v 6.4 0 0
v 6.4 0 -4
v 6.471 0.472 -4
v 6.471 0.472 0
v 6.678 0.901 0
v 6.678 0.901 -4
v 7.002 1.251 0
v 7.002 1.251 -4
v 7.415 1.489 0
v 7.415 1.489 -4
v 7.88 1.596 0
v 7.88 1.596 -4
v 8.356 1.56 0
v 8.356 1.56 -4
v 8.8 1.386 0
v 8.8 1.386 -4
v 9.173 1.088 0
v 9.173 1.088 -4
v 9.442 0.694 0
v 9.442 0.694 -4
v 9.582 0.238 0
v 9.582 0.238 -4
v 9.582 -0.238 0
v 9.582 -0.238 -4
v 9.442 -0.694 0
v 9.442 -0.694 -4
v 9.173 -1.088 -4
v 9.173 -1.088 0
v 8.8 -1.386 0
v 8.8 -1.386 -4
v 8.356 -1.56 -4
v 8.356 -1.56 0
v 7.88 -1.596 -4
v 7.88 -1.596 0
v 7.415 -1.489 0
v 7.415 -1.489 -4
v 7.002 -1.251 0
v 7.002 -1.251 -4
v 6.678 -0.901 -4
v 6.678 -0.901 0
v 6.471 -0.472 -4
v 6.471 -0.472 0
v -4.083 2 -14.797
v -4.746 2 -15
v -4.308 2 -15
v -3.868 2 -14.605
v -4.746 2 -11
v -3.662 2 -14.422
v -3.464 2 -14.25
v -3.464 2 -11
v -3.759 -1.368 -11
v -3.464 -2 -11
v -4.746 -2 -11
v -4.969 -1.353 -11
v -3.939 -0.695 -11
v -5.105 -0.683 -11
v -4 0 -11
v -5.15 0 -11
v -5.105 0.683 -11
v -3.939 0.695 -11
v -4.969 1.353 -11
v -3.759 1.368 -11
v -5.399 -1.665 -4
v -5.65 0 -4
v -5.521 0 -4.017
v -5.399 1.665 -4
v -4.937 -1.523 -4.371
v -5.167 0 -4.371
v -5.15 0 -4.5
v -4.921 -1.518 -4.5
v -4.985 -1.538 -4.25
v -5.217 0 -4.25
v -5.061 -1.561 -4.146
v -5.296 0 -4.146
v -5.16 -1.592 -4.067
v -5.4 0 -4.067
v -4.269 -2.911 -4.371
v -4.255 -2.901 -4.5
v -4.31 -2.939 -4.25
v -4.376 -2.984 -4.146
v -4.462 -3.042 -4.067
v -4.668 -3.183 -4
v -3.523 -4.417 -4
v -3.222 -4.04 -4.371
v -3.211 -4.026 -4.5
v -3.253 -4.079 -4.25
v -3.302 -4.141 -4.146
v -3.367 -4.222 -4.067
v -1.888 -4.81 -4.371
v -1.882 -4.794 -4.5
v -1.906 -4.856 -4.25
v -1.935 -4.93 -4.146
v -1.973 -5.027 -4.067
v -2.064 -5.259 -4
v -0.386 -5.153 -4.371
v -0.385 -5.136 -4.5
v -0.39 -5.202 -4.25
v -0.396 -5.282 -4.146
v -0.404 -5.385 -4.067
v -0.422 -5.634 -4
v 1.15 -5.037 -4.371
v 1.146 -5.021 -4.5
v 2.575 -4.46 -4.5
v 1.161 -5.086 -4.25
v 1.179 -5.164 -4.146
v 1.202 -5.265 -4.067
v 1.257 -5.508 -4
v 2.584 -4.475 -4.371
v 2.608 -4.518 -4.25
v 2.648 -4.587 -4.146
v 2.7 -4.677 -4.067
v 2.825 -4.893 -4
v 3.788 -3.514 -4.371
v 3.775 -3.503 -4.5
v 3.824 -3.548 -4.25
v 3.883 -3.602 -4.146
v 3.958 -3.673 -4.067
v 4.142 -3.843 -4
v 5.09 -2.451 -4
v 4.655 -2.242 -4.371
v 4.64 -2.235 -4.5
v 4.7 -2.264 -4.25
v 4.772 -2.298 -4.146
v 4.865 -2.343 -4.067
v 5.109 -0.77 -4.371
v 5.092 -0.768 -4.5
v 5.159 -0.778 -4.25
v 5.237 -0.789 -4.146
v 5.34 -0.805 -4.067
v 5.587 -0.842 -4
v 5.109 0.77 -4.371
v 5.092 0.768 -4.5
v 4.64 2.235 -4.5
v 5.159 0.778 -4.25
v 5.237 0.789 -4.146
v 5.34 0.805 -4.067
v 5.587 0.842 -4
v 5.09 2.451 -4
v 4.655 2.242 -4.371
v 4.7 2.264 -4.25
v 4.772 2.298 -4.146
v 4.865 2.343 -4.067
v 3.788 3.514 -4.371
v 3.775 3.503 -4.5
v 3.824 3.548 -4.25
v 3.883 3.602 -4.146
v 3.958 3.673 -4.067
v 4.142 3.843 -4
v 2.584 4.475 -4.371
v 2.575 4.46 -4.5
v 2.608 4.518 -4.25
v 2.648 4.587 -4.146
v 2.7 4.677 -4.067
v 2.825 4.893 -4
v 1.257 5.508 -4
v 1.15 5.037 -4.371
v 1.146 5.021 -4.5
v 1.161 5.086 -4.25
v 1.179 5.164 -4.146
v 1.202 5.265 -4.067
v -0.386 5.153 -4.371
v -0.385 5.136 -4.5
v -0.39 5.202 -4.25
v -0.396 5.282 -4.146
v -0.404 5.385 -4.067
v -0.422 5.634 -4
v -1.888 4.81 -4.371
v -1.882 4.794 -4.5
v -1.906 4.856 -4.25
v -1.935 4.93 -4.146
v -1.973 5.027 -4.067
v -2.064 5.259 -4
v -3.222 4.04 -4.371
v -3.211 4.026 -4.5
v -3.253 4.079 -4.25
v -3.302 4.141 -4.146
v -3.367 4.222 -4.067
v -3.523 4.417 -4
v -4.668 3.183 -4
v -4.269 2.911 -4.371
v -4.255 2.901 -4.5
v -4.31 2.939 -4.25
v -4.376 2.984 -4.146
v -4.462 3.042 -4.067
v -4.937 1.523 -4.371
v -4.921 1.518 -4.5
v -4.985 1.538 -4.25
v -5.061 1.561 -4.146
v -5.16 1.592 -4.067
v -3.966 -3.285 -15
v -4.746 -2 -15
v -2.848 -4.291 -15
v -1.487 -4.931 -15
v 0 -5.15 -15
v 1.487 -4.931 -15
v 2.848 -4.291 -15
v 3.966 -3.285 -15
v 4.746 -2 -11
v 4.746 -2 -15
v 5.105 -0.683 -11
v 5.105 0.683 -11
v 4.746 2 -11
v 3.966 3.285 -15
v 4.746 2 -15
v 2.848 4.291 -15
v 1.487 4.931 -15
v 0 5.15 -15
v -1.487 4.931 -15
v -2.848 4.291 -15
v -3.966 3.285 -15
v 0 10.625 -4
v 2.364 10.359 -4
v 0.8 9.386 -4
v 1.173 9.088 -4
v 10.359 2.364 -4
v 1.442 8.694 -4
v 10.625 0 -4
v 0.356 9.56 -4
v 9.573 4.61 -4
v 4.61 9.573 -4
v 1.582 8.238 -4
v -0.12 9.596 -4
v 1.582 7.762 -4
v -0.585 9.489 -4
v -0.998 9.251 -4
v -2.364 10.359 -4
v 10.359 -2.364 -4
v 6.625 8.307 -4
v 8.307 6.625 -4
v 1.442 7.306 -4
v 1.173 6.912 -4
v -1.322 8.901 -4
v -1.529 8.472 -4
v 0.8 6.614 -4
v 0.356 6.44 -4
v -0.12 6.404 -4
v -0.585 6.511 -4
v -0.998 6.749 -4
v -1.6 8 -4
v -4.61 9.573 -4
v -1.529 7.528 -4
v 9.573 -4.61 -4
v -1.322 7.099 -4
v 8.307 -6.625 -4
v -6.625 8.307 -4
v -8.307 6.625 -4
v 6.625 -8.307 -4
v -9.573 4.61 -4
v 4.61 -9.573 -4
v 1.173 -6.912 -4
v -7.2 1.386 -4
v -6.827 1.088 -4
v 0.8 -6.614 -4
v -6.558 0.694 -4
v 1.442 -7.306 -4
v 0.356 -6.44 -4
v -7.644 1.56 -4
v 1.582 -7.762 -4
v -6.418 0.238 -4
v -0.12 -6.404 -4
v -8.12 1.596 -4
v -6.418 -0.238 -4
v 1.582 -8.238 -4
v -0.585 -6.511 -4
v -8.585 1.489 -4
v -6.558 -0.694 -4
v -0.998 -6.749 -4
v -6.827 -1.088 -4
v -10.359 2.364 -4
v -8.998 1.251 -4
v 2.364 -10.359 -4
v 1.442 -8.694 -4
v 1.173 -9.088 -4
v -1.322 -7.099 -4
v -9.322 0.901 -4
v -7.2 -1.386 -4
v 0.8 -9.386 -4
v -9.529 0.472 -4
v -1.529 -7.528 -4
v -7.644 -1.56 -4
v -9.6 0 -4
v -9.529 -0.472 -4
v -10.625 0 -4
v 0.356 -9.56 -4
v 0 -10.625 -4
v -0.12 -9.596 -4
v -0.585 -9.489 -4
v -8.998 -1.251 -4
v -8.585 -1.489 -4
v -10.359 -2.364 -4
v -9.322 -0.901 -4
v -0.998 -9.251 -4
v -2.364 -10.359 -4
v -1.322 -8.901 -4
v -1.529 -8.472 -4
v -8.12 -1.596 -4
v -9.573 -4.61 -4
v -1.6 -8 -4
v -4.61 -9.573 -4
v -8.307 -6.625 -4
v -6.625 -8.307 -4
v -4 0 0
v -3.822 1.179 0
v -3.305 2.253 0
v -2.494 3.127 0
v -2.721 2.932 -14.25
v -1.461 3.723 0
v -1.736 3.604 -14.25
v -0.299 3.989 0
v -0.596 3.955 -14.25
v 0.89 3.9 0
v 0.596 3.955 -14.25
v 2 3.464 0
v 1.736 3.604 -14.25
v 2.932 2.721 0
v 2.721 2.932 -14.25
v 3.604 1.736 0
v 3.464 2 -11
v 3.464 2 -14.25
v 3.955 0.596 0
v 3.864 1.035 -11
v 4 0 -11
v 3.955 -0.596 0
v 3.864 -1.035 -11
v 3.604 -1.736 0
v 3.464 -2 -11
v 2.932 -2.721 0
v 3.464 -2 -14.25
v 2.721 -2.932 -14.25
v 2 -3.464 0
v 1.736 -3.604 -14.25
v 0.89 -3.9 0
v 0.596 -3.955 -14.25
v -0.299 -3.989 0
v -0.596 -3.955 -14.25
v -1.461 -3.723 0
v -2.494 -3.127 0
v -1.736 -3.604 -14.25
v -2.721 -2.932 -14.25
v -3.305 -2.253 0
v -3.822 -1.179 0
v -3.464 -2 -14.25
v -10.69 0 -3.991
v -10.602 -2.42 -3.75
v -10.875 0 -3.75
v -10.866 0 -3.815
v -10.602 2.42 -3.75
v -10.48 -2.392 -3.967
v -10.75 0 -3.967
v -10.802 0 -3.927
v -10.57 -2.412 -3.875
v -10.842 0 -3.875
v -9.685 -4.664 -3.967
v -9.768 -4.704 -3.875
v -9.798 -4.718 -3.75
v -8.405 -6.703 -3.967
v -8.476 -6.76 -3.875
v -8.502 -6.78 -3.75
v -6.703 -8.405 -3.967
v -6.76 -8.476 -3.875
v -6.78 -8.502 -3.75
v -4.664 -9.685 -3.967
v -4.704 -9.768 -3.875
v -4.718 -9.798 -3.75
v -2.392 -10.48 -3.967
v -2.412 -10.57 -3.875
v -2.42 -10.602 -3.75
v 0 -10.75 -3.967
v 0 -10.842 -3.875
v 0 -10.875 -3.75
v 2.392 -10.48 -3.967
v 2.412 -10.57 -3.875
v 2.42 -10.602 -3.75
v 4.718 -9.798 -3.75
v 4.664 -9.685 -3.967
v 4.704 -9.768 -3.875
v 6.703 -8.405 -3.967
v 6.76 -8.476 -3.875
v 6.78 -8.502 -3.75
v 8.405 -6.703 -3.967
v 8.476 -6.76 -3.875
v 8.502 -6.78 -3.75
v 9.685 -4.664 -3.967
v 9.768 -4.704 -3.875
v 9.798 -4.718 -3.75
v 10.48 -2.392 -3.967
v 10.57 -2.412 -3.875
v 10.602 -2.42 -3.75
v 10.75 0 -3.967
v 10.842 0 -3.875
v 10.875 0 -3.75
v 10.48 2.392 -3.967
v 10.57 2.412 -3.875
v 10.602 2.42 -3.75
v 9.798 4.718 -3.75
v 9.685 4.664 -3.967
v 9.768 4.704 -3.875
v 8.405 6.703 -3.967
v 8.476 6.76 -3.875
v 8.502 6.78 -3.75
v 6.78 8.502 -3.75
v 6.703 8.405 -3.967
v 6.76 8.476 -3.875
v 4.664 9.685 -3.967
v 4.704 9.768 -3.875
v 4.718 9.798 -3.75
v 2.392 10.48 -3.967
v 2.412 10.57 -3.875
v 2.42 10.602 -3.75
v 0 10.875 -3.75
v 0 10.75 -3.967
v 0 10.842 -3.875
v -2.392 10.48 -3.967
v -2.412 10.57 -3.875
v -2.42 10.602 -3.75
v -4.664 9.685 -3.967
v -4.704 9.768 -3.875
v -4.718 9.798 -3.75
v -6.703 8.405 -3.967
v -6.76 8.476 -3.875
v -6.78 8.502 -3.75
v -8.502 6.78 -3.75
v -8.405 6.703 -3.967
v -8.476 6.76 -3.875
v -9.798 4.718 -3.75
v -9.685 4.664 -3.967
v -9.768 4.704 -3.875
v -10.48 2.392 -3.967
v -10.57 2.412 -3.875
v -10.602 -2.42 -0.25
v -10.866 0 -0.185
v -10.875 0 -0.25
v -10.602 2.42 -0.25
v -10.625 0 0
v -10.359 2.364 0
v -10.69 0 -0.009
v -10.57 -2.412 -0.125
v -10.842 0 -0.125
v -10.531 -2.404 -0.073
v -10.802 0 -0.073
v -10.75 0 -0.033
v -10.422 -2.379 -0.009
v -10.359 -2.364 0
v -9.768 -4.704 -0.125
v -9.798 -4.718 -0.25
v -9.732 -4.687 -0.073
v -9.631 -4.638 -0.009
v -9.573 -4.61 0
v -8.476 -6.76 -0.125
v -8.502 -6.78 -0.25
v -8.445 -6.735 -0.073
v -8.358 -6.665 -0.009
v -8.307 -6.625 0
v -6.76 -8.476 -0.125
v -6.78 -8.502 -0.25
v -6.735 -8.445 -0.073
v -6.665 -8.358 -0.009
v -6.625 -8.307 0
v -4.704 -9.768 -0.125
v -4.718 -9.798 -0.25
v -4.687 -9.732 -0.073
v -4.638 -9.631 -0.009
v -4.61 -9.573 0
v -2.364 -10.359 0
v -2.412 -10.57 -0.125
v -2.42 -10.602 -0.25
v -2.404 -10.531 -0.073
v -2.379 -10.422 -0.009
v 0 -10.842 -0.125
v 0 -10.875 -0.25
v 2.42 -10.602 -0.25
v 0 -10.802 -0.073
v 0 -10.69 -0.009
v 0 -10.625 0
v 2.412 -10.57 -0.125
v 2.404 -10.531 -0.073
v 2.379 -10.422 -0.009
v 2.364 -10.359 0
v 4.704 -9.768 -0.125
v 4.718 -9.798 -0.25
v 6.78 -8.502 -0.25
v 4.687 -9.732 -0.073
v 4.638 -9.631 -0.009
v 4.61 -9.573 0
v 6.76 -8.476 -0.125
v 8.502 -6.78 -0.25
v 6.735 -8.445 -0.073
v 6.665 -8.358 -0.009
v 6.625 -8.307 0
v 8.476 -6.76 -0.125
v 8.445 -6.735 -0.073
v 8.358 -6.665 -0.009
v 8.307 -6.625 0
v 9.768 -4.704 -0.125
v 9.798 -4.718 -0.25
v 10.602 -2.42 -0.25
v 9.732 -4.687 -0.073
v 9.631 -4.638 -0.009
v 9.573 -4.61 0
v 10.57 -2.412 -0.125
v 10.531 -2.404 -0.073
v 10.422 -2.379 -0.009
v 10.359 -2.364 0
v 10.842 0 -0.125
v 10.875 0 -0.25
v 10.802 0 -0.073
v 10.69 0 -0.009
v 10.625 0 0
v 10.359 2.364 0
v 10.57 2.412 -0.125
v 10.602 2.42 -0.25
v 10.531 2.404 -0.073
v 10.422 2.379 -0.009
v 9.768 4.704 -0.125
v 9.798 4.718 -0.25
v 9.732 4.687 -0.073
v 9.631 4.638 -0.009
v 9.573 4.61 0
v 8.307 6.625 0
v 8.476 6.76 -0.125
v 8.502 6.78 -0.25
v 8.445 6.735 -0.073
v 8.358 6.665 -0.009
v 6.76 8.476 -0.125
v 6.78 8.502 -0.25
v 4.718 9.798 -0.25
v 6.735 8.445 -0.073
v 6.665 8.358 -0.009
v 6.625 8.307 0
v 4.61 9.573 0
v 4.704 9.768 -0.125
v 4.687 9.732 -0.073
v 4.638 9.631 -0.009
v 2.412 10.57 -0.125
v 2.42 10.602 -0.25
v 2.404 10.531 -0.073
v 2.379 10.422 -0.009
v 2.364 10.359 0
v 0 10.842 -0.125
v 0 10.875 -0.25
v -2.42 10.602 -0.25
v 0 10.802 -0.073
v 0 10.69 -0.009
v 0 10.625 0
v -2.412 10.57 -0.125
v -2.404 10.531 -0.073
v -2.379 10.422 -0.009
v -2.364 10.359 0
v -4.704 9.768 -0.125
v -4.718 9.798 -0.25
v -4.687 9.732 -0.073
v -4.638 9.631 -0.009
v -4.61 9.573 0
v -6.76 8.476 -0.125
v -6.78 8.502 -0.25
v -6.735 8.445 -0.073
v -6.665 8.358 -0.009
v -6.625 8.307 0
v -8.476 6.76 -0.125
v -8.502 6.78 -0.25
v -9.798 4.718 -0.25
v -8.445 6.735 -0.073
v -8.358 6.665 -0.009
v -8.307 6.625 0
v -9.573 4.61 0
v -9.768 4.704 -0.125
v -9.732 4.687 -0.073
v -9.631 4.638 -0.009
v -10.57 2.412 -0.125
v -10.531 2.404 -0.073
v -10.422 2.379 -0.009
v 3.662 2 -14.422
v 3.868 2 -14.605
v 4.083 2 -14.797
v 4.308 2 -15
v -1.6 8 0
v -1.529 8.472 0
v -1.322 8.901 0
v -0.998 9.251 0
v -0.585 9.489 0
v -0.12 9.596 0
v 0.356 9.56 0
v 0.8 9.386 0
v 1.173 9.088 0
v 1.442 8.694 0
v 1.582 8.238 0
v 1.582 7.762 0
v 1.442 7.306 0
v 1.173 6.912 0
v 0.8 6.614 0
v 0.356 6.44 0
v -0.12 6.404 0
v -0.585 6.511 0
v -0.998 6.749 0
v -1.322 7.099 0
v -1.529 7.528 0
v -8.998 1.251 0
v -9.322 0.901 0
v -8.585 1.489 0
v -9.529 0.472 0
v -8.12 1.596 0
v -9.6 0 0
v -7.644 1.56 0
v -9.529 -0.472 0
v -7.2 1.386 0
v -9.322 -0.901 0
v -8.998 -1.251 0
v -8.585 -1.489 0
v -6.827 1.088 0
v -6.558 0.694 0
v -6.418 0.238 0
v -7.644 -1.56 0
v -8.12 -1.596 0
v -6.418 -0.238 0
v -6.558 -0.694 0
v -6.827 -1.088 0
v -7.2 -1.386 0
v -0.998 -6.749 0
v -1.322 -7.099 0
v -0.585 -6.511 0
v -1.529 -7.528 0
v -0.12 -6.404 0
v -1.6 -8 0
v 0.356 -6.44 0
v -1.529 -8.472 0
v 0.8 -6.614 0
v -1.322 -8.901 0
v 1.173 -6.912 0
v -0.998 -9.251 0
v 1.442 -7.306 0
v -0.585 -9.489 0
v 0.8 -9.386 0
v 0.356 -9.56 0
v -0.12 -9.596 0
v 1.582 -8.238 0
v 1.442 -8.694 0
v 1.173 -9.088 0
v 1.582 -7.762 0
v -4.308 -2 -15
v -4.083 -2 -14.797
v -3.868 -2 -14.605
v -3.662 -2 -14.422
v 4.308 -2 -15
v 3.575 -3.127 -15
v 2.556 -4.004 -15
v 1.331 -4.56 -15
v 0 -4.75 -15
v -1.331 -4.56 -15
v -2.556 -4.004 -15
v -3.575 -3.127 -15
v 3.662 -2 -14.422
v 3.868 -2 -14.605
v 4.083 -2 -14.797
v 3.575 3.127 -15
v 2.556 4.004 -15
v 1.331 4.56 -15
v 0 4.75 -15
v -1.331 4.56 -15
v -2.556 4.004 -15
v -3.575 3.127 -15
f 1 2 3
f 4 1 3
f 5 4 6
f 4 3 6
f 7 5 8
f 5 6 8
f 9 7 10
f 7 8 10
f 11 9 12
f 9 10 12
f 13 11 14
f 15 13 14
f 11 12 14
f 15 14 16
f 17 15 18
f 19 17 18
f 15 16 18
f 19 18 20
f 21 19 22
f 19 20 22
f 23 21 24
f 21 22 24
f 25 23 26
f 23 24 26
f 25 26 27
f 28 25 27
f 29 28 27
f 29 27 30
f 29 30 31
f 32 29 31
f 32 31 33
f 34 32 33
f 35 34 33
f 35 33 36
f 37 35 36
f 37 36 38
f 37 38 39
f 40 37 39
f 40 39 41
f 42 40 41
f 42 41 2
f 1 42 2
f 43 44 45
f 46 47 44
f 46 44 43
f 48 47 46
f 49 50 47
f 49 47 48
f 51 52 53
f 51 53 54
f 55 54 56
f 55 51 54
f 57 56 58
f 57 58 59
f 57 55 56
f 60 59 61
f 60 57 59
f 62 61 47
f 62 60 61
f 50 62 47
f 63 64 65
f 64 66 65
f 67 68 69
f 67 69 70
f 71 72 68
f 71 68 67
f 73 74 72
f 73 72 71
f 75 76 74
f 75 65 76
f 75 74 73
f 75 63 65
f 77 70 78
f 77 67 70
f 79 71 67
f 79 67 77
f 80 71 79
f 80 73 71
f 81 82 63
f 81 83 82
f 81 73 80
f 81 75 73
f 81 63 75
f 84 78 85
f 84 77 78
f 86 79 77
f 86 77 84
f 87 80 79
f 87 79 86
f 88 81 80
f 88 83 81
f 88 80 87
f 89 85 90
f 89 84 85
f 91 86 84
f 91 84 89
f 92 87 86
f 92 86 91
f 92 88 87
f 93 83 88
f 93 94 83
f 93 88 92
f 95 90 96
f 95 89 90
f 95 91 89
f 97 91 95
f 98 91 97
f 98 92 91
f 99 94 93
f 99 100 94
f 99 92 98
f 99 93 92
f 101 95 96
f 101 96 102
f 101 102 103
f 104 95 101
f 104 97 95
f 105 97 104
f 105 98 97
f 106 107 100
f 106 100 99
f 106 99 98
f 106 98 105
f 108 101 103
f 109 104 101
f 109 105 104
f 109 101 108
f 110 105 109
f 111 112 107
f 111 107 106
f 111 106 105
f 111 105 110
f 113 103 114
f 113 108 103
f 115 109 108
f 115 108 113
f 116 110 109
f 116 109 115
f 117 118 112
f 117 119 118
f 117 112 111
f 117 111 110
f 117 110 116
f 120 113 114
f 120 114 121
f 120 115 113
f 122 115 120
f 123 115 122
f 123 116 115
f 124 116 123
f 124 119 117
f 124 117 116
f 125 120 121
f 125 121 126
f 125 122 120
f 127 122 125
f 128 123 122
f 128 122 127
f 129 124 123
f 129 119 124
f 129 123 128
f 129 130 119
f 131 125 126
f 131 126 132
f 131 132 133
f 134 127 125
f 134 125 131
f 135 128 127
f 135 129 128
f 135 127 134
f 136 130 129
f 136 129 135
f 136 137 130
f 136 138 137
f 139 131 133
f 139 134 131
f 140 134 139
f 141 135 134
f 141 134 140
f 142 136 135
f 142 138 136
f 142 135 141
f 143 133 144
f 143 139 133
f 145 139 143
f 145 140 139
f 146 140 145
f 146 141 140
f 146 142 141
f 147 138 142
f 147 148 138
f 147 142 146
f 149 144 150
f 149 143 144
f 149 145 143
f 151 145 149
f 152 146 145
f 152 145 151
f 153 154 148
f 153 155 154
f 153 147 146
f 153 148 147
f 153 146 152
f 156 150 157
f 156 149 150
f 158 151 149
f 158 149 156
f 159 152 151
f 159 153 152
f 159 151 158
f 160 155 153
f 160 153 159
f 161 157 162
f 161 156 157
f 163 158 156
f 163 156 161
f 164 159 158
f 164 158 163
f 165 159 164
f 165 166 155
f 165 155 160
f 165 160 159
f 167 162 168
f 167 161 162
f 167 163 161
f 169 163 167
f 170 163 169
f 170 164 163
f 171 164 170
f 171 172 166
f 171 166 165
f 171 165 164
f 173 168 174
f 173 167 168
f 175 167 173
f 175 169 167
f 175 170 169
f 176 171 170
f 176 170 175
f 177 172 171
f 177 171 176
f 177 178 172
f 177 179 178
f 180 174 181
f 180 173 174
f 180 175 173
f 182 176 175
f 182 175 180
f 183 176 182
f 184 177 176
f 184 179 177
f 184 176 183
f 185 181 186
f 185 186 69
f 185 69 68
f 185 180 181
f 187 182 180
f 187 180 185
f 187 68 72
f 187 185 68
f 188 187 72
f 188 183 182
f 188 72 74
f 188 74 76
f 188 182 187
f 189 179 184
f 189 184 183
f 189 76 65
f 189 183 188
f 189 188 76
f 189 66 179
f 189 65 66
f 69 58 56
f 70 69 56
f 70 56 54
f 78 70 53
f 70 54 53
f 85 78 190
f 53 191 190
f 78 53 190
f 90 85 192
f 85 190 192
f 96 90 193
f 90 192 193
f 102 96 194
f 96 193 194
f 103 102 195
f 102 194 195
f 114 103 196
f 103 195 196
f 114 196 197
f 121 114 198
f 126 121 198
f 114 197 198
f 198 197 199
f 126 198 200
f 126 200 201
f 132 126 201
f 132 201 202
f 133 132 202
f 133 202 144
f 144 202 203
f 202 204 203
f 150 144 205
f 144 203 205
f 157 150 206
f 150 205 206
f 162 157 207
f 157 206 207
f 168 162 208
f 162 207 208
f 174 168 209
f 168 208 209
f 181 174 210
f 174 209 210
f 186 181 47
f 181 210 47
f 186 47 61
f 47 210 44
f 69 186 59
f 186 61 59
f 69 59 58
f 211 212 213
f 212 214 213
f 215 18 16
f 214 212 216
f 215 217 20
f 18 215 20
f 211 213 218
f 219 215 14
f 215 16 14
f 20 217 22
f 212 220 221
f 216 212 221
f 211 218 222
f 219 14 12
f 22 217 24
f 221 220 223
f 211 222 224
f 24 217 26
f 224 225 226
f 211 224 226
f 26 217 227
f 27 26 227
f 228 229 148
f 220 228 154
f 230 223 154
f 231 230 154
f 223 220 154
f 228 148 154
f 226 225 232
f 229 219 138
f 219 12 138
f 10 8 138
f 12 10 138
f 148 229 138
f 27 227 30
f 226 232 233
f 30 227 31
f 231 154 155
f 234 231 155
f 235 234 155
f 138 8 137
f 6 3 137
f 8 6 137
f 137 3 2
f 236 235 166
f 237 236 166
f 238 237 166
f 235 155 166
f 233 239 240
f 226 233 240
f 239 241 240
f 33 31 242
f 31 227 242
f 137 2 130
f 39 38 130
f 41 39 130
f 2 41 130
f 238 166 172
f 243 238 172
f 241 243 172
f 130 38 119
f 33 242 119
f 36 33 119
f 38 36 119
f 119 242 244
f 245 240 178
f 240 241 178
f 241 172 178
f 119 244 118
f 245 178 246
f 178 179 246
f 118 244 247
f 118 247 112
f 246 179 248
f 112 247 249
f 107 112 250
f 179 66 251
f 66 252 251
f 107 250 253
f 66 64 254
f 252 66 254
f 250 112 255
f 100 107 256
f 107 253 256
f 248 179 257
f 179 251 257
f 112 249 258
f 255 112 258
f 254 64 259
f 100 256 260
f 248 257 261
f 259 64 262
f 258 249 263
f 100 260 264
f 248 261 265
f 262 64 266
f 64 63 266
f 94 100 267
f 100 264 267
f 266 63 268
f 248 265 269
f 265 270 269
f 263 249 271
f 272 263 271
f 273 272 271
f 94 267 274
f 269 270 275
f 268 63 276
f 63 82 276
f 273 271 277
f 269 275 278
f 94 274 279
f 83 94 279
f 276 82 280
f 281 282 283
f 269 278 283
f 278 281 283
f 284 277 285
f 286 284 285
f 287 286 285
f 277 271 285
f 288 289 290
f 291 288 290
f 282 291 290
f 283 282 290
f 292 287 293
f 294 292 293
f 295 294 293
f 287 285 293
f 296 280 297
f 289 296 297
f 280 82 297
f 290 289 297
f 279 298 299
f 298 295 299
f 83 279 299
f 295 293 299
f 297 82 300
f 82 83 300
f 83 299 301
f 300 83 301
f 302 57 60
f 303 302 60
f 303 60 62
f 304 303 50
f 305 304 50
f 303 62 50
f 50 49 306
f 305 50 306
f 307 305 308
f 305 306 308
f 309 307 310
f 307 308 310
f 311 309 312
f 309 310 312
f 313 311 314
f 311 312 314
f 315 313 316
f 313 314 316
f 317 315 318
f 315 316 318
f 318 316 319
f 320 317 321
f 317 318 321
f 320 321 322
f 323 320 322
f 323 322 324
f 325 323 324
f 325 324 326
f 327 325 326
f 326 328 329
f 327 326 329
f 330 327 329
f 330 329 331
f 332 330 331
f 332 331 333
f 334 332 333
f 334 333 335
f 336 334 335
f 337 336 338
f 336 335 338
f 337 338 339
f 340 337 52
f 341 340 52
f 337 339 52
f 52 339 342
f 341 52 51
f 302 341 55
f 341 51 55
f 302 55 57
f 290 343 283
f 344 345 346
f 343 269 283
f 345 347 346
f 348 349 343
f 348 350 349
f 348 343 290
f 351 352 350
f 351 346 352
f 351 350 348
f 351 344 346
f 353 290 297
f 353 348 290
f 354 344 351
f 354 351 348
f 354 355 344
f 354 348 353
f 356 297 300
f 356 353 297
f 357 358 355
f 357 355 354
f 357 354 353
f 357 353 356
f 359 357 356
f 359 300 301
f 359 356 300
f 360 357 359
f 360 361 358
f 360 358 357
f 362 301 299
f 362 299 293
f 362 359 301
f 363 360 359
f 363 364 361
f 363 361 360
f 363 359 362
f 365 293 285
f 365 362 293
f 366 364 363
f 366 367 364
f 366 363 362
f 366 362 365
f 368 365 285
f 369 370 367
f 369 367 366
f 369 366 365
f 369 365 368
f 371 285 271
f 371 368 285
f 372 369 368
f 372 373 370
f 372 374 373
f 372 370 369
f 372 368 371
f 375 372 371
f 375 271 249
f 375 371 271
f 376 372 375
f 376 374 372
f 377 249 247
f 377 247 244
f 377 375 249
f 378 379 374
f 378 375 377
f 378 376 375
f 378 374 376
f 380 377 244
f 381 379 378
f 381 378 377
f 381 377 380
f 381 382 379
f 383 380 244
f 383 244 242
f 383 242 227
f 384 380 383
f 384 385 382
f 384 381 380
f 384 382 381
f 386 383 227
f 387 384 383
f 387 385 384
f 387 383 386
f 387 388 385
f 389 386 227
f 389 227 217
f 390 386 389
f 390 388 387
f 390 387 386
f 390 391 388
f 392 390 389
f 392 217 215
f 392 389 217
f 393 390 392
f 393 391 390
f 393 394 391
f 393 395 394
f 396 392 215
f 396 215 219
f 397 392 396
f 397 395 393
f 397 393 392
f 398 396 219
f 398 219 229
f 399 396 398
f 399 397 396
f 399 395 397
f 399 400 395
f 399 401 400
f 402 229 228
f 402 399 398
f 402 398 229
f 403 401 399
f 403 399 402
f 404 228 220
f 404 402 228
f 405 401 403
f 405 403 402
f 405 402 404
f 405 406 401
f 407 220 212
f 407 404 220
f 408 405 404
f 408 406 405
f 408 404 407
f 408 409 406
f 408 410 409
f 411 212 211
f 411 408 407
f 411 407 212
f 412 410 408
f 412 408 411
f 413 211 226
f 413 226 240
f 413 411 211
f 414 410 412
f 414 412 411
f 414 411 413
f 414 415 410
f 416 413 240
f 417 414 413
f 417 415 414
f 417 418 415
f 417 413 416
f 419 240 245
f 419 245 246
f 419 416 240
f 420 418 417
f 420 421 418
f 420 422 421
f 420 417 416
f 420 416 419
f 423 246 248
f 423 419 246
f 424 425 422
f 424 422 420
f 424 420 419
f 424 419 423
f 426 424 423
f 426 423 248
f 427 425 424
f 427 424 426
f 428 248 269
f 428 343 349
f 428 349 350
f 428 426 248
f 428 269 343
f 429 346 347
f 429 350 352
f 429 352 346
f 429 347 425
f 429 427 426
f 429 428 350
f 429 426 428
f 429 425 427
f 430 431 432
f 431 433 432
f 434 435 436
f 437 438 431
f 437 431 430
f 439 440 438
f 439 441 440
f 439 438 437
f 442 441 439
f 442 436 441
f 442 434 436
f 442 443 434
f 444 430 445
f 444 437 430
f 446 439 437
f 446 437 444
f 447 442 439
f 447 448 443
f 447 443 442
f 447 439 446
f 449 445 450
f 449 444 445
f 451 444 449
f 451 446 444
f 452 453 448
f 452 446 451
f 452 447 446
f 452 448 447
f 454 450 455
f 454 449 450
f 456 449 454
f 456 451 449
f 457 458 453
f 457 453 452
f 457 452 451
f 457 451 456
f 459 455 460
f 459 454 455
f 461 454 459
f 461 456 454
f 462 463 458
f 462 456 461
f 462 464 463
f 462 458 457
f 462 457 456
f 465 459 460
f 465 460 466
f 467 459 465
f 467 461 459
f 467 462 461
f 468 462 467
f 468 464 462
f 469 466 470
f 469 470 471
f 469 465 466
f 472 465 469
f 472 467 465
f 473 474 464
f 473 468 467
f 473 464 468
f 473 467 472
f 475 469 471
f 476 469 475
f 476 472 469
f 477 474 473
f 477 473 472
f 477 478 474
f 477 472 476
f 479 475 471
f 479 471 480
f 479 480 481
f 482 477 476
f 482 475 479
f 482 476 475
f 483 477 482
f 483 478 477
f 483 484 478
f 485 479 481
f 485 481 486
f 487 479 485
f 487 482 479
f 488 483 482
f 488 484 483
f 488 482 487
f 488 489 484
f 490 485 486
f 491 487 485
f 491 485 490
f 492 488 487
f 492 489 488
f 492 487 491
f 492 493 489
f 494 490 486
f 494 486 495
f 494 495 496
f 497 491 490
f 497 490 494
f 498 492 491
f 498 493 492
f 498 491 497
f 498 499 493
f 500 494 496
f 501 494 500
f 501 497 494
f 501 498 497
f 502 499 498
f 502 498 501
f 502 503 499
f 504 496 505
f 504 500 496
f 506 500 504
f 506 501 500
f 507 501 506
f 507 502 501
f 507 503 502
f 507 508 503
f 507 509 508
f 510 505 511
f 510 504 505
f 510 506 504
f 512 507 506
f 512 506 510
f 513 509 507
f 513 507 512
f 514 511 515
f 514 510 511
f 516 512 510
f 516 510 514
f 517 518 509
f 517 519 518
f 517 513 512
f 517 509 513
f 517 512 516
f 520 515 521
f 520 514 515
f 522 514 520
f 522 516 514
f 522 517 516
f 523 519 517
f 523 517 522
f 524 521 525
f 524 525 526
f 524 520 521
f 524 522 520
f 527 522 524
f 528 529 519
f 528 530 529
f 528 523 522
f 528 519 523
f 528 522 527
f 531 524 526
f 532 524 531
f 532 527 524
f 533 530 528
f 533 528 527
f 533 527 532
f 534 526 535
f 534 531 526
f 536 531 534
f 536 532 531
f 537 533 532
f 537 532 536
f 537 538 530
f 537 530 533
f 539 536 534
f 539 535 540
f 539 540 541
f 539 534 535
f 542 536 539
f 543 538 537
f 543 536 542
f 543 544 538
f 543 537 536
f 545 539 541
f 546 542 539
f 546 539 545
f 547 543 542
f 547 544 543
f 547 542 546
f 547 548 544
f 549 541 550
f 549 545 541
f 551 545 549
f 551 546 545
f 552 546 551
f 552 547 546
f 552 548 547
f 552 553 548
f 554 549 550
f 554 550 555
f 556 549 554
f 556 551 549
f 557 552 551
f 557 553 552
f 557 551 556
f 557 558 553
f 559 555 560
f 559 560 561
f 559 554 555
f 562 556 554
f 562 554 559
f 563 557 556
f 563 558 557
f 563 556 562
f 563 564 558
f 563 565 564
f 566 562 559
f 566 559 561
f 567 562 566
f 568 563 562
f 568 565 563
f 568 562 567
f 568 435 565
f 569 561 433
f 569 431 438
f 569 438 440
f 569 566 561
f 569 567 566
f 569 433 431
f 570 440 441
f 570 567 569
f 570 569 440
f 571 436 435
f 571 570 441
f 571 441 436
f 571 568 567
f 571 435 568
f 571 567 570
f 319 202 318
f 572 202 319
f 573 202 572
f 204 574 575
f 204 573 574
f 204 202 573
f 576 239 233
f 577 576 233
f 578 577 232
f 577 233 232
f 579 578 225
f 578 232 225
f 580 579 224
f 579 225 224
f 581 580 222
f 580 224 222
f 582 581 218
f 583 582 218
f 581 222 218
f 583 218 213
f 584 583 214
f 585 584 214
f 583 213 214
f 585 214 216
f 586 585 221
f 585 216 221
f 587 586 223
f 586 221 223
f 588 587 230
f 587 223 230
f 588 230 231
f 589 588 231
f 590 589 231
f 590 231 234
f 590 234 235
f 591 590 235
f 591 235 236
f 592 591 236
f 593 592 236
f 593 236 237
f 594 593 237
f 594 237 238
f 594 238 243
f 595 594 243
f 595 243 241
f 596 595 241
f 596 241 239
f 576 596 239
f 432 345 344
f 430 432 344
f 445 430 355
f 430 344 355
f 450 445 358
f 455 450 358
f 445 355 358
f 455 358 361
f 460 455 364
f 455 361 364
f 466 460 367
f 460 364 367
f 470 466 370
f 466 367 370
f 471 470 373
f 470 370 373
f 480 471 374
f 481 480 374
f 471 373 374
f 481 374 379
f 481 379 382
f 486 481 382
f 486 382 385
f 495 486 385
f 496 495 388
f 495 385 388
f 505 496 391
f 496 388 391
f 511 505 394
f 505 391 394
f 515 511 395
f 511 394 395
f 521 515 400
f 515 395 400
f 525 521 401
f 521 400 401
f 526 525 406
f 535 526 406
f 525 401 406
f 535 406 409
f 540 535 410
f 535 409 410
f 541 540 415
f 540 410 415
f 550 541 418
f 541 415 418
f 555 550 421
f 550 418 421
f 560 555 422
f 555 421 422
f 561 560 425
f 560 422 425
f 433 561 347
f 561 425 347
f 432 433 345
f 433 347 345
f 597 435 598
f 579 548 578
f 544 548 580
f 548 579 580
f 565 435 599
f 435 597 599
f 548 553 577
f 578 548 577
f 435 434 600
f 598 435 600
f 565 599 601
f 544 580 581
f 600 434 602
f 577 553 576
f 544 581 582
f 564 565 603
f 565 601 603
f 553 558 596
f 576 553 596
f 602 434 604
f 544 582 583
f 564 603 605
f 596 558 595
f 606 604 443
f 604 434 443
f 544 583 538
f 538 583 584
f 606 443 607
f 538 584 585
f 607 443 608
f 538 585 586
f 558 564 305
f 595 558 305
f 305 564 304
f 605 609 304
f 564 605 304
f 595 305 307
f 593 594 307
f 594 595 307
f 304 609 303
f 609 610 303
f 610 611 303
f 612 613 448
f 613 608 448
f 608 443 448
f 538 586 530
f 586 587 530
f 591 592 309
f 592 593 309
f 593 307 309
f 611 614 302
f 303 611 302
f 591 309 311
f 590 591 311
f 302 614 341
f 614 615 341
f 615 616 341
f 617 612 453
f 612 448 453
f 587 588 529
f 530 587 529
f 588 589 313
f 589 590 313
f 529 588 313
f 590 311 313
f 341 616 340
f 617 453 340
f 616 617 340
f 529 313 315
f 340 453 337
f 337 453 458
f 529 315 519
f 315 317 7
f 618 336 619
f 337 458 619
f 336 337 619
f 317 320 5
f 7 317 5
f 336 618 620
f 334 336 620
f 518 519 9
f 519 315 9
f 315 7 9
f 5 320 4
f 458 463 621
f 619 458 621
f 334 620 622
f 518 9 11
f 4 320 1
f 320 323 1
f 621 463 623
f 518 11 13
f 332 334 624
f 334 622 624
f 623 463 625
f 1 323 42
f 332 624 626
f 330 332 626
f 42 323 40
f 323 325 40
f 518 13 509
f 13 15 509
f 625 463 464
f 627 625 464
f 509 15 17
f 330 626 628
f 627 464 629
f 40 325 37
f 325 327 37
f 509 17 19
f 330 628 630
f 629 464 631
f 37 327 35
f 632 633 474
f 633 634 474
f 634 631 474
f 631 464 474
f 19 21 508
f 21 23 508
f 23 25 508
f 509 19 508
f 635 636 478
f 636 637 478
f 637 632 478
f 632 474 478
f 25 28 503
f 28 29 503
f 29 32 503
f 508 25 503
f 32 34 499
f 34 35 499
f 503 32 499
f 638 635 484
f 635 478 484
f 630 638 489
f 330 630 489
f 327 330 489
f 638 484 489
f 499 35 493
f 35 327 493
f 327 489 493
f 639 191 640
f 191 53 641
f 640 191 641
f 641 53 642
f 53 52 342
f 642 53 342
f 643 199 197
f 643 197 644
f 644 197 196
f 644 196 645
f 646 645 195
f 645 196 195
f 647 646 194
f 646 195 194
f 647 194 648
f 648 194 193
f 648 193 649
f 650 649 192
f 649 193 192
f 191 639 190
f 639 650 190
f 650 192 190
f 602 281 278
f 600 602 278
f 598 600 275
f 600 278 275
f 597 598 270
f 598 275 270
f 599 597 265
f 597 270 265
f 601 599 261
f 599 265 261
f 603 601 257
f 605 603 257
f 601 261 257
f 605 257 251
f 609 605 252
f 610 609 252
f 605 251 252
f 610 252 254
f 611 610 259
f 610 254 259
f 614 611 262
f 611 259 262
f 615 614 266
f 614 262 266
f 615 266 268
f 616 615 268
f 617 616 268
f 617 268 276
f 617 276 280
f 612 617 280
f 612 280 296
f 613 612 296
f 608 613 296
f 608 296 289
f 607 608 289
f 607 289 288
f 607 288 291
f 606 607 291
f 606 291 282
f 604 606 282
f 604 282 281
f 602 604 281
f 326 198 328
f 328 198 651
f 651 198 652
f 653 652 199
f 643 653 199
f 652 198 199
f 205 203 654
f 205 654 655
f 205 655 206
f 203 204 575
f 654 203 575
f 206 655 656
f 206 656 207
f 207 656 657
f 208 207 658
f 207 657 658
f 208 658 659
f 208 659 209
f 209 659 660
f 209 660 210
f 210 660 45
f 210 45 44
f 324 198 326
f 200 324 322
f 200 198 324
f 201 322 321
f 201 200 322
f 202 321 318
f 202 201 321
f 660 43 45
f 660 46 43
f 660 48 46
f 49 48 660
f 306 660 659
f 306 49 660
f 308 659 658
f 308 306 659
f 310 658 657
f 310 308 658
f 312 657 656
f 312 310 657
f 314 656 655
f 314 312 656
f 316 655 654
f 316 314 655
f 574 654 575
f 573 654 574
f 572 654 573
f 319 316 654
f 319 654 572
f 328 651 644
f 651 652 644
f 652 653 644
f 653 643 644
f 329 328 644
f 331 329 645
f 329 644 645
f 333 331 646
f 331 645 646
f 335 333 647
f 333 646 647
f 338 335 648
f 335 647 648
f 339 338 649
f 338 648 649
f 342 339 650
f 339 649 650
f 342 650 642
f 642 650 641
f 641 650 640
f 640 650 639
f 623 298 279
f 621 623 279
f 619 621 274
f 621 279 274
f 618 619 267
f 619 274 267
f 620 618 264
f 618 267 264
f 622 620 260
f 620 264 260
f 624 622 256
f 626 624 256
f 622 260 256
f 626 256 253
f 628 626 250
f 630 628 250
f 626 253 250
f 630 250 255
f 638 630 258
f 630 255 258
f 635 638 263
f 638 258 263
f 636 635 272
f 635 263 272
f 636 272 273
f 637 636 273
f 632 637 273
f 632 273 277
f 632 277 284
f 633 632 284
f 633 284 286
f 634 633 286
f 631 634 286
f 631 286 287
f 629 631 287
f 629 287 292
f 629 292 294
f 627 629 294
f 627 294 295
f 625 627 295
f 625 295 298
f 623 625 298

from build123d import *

# Parameters (mm, degrees)
SKETCH2_R          = 4
CUT_EXTRUDE1_DEPTH = 22.483278381
SKETCH3_R          = 1.6
CUT_EXTRUDE2_DEPTH = 19.908496767
SKETCH4_W          = 4
SKETCH4_H          = 4
CUT_EXTRUDE3_DEPTH = 25.496249713
CHAMFER1_SIZE      = 0.75
CHAMFER2_SIZE      = 0.75
FILLET1_R          = 0.5
FILLET2_R          = 0.25


with BuildPart() as part:
    # Sketch1 → Revolve1 (revolve)
    with BuildSketch(Plane(origin=(0, 0, 0), x_dir=(1, 0, 0), z_dir=(0, 1, 0))):
        Polygon((0, 0), (-10.875, 0), (-10.875, 4), (-5.15, 4), (-5.15, 15), (0, 15), align=None)
    revolve(axis=Axis((0, 0, -15), (0, 0, 1)))

    # Sketch2 → Cut-Extrude1 (cut, through all)
    with BuildSketch(Plane(origin=(0, 0, -15), x_dir=(-1, 0, 0), z_dir=(0, 0, -1))):
        Circle(SKETCH2_R)
    extrude(amount=-CUT_EXTRUDE1_DEPTH, mode=Mode.SUBTRACT)

    # Sketch3 → Cut-Extrude2 (cut, through all)
    with BuildSketch(Plane(origin=(0, 0, -4), x_dir=(-1, 0, 0), z_dir=(0, 0, -1))):
        with Locations((0, 8)):
            Circle(SKETCH3_R)
        with Locations((8, 0)):
            Circle(SKETCH3_R)
        with Locations((0, -8)):
            Circle(SKETCH3_R)
        with Locations((-8, 0)):
            Circle(SKETCH3_R)
    extrude(amount=-CUT_EXTRUDE2_DEPTH, mode=Mode.SUBTRACT)

    # Sketch4 → Cut-Extrude3 (cut, through all)
    with BuildSketch(Plane(origin=(5.15, 0, 0), x_dir=(0, 0, -1), z_dir=(1, 0, 0))):
        with Locations((13, 0)):
            Rectangle(SKETCH4_W, SKETCH4_H)
    extrude(amount=-CUT_EXTRUDE3_DEPTH, mode=Mode.SUBTRACT)

    # Chamfer1
    chamfer1_edges = [part.edges().sort_by_distance(p)[0] for p in [
        (0, 4, -15),
    ]]
    chamfer(chamfer1_edges, length=CHAMFER1_SIZE)

    # Chamfer2
    chamfer2_edges = [part.edges().sort_by_distance(p)[0] for p in [
        (0, -4, -15),
    ]]
    chamfer(chamfer2_edges, length=CHAMFER2_SIZE)

    # Fillet1
    fillet1_edges = [part.edges().sort_by_distance(p)[0] for p in [
        (5.15, 0, -4),
    ]]
    fillet(fillet1_edges, radius=FILLET1_R)

    # Fillet2
    fillet2_edges = [part.edges().sort_by_distance(p)[0] for p in [
        (10.875, 0, -4),
        (10.875, 0, 0),
    ]]
    fillet(fillet2_edges, radius=FILLET2_R)


solid = part.part
